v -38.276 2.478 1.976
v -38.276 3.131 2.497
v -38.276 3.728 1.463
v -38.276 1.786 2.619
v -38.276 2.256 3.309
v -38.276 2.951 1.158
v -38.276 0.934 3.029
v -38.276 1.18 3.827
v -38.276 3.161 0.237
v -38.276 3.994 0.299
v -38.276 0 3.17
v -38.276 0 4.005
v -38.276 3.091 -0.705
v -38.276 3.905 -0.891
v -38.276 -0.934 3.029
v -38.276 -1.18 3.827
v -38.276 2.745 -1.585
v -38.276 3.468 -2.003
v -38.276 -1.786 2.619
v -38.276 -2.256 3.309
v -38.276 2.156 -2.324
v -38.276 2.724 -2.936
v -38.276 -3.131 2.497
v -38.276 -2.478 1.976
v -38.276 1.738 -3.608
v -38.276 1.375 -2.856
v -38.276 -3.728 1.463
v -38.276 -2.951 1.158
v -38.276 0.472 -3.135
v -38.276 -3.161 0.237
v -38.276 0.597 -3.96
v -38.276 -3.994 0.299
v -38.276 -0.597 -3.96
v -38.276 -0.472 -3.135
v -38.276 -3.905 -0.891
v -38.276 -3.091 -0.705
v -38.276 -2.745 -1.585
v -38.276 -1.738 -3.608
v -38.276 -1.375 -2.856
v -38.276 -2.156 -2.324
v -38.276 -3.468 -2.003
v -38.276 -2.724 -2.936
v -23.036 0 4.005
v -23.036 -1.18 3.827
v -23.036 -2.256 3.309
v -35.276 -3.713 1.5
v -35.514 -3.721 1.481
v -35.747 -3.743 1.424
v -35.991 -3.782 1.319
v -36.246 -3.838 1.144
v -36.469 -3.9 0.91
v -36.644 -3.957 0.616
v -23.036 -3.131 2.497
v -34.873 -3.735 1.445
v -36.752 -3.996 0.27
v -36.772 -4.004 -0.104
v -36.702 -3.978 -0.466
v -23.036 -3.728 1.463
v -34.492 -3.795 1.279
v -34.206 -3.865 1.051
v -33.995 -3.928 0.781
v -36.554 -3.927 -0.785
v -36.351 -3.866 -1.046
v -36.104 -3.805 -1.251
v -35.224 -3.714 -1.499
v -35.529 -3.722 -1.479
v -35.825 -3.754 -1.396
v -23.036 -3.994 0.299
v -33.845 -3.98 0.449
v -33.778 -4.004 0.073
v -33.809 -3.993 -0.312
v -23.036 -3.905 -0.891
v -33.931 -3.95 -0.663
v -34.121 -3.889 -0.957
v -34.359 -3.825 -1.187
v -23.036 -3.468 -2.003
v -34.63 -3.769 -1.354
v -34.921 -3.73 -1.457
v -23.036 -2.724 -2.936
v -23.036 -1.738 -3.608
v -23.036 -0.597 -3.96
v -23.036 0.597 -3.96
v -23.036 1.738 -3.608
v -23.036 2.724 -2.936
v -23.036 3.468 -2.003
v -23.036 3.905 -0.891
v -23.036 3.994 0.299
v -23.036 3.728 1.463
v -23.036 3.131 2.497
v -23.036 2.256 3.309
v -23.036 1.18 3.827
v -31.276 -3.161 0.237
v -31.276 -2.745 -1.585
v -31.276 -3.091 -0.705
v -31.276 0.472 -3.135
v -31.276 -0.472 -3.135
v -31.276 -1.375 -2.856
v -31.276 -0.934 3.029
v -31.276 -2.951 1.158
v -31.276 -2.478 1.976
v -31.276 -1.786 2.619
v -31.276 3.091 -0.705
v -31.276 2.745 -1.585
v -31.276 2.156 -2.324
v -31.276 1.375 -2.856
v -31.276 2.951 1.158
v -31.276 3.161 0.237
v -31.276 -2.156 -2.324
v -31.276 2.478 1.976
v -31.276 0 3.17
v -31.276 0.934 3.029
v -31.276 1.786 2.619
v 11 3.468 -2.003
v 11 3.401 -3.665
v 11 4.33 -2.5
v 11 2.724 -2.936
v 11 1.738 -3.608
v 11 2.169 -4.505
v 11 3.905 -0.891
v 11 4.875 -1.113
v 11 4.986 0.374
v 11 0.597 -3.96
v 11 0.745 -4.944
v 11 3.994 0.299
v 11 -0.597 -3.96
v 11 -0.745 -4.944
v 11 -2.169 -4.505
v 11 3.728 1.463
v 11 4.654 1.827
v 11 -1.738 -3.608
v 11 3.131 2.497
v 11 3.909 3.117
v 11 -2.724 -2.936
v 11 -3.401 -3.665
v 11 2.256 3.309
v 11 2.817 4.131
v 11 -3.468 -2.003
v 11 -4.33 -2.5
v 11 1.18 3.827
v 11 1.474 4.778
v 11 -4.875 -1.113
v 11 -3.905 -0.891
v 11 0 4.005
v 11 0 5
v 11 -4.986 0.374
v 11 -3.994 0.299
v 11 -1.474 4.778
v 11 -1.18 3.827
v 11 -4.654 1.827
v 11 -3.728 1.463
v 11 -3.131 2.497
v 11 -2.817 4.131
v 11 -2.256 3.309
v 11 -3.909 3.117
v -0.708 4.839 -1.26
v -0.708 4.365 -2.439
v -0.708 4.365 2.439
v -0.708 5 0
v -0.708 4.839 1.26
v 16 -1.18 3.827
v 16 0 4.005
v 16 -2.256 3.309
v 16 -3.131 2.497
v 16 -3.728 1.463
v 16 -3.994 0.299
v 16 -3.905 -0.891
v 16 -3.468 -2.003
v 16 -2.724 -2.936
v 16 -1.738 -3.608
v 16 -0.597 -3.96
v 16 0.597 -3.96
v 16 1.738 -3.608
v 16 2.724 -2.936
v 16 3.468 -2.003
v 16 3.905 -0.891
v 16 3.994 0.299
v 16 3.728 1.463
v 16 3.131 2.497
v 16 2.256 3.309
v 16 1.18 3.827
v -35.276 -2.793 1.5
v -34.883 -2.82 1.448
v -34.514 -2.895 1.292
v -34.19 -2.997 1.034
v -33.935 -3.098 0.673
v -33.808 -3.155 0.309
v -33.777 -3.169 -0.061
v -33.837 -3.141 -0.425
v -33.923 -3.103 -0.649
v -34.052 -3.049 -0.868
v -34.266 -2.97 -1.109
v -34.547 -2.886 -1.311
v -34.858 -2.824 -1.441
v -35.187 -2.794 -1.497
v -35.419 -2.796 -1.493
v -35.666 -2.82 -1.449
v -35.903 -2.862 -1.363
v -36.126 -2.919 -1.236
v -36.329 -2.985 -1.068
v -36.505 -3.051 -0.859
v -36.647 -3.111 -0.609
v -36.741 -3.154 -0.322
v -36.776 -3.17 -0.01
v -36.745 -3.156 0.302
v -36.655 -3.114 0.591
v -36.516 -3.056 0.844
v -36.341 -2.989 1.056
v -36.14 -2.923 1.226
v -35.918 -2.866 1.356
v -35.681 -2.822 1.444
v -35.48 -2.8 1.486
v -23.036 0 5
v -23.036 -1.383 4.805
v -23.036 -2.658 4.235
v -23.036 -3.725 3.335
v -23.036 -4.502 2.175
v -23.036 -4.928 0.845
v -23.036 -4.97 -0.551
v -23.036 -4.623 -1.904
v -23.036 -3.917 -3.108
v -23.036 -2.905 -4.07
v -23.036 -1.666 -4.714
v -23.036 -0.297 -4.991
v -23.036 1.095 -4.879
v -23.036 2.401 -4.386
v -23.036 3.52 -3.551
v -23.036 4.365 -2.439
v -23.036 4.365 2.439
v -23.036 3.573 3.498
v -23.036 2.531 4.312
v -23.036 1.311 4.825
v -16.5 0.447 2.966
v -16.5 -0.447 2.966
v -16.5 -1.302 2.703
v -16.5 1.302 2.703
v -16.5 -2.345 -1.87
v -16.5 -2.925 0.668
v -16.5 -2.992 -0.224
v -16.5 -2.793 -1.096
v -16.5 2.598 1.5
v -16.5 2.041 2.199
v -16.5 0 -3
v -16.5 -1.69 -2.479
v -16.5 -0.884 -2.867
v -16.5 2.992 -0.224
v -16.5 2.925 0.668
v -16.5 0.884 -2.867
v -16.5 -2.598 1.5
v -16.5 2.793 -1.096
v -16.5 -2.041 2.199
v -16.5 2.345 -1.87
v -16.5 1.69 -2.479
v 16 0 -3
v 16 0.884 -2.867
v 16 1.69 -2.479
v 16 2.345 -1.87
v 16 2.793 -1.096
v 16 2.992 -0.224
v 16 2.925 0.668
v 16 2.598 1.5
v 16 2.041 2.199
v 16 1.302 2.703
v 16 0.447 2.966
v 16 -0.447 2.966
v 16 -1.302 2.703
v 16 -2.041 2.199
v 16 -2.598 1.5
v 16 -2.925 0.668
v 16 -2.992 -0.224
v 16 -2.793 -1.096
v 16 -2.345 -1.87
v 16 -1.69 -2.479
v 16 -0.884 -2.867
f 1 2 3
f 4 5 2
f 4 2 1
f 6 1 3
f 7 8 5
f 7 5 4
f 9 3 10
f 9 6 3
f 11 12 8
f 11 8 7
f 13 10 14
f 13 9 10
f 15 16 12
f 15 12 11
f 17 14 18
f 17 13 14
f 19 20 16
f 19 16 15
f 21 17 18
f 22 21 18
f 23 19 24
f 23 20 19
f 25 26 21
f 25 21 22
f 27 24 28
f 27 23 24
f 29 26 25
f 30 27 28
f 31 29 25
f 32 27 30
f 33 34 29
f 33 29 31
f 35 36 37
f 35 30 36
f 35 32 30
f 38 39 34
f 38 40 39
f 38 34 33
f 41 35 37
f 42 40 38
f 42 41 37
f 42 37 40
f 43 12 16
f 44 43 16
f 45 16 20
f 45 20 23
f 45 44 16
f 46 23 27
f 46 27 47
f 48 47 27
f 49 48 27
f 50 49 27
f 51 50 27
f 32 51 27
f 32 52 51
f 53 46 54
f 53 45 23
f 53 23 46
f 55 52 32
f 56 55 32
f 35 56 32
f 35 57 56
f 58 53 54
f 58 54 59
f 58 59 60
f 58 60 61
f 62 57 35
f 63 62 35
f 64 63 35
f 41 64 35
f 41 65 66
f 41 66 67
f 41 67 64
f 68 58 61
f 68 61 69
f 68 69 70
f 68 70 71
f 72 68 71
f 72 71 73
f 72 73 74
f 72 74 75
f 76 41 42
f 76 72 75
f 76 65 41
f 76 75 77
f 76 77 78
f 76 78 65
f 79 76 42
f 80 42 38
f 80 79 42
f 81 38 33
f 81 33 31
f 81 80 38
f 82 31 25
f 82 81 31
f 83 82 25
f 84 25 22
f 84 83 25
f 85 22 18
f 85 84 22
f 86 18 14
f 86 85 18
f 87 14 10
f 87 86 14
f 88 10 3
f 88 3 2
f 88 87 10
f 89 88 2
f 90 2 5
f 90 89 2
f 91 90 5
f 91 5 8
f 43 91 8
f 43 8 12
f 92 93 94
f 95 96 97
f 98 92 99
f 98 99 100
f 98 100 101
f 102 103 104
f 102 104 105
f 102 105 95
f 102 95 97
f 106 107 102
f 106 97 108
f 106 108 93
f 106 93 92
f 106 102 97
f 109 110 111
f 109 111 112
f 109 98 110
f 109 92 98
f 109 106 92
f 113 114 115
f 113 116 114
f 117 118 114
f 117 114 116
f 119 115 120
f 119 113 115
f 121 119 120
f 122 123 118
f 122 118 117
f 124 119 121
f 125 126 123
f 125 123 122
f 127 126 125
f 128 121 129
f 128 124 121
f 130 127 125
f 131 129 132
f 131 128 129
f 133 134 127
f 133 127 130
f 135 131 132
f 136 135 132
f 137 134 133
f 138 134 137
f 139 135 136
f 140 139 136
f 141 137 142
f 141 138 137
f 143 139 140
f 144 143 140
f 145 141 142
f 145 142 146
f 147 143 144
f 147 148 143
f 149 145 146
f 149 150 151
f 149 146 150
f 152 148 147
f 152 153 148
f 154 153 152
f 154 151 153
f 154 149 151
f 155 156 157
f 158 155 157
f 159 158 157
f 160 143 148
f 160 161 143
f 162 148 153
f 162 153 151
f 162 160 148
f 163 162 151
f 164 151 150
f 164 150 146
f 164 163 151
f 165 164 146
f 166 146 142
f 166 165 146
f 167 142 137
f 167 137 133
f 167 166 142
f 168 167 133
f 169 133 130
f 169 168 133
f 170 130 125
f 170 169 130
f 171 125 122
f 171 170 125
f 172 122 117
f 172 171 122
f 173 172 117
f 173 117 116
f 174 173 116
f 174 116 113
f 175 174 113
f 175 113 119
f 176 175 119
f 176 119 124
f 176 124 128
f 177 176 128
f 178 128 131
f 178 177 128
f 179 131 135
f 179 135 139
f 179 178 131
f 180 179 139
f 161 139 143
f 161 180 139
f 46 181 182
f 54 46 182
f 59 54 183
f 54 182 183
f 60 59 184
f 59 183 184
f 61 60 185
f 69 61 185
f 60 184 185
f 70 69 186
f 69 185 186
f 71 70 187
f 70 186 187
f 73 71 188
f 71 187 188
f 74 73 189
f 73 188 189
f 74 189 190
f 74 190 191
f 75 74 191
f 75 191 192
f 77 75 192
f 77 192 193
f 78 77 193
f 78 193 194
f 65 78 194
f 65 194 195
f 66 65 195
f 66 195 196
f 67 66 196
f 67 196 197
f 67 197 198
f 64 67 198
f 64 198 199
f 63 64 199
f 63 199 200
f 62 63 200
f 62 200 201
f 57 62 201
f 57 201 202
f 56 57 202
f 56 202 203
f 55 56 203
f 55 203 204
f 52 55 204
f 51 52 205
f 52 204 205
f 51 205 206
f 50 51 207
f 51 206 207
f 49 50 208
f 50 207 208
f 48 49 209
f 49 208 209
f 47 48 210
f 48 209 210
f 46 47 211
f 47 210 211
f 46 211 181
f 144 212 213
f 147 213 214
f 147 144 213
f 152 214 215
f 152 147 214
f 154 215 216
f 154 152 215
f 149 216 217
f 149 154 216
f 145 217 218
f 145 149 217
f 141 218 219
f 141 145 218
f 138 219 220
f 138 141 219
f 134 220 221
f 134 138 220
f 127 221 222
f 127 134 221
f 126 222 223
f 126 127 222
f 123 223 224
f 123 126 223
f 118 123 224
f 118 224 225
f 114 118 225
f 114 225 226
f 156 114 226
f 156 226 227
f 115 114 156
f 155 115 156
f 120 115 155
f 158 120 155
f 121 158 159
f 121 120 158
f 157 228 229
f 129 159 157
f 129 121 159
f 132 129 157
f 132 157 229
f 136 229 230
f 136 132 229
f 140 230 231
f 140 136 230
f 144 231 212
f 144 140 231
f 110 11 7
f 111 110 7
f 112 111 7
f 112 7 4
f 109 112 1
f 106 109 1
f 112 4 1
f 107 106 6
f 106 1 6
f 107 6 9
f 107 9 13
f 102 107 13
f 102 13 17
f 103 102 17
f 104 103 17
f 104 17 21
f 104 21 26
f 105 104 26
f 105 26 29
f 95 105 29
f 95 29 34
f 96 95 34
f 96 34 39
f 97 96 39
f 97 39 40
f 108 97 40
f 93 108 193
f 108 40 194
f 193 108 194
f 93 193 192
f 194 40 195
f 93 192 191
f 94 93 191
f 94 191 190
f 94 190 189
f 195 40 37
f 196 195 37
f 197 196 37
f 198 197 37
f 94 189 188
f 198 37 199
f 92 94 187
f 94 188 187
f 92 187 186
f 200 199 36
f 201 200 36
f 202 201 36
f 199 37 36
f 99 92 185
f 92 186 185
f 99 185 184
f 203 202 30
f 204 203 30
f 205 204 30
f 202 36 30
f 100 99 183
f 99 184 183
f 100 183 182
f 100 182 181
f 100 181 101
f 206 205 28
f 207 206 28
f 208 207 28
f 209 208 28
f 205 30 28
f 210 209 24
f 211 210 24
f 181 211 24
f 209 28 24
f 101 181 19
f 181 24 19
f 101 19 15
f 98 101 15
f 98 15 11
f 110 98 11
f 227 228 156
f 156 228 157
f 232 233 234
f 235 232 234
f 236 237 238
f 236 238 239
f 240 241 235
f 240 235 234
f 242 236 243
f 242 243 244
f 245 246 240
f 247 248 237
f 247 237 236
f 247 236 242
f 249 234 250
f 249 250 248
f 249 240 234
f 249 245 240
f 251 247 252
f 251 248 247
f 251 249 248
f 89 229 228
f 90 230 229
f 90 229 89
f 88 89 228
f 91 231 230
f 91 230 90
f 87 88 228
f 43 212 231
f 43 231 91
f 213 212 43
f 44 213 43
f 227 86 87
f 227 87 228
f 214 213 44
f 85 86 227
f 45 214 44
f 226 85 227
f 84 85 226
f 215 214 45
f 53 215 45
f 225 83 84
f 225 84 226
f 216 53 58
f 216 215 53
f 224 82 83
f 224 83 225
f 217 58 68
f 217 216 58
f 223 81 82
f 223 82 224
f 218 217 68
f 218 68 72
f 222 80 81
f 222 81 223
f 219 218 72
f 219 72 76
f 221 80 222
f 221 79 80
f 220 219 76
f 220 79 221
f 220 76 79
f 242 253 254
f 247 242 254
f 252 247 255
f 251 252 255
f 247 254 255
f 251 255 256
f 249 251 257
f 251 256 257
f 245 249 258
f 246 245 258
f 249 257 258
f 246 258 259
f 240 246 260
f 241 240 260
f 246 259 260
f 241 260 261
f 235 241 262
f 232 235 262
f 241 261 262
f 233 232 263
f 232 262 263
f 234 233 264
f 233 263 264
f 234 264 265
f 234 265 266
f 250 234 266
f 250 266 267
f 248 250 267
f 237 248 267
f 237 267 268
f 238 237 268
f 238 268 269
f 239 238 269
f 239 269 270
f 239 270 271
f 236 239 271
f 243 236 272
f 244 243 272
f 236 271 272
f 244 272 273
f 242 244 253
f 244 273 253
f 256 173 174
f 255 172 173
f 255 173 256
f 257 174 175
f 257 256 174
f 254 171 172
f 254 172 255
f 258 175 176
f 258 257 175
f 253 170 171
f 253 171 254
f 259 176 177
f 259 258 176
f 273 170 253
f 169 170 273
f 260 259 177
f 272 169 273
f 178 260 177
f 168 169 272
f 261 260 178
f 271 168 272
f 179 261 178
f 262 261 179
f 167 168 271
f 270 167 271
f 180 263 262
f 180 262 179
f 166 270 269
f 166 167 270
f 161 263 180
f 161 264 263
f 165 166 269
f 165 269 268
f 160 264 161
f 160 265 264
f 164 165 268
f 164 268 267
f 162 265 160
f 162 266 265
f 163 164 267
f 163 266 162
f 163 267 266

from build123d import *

# Parameters (mm, degrees)
SKETCH8_R          = 1.5
CUT_EXTRUDE2_DEPTH = 10
SKETCH9_R          = 3.17
CUT_EXTRUDE3_DEPTH = 7
SKETCH10_R         = 3
CUT_EXTRUDE4_DEPTH = 32.5
SKETCH12_W         = 24.803289192
SKETCH12_H         = 5.136244689
CUT_EXTRUDE5_DEPTH = 12.7


with BuildPart() as part:
    # Sketch6 → Revolve1 (revolve)
    with BuildSketch(Plane.XY, mode=Mode.PRIVATE) as revolve1_sk:
        Polygon((-38.276, 0), (-38.276, 4.005), (-23.036, 4.005), (-23.036, 5), (11, 5), (11, 4.005), (16, 4.005), (16, 0), align=None)
    revolve(revolve1_sk.sketch.rotate(Axis((-1000, 0, 0), (1, 0, 0)), 90), axis=Axis((-1000, 0, 0), (1, 0, 0)))

    # Sketch8 → Cut-Extrude2 (cut)
    with BuildSketch(Plane(origin=(0, 0, 0), x_dir=(1, 0, 0), z_dir=(0, 1, 0))):
        with Locations(Location((-35.276, 0, 0), (0, 0, 270))):
            Circle(SKETCH8_R)
    extrude(amount=-CUT_EXTRUDE2_DEPTH, mode=Mode.SUBTRACT)

    # Sketch9 → Cut-Extrude3 (cut)
    with BuildSketch(Plane.ZY.offset(38.276)):
        Circle(SKETCH9_R)
    extrude(amount=-CUT_EXTRUDE3_DEPTH, mode=Mode.SUBTRACT)

    # Sketch10 → Cut-Extrude4 (cut)
    with BuildSketch(Plane(origin=(16, 0, 0), x_dir=(0, 0, -1), z_dir=(1, 0, 0))):
        Circle(SKETCH10_R)
    extrude(amount=-CUT_EXTRUDE4_DEPTH, mode=Mode.SUBTRACT)

    # Sketch12 → Cut-Extrude5 (cut, symmetric)
    with BuildSketch(Plane.XY):
        with Locations((-13.109401935, 6.933122345)):
            Rectangle(SKETCH12_W, SKETCH12_H)
    extrude(amount=CUT_EXTRUDE5_DEPTH, both=True, mode=Mode.SUBTRACT)


solid = part.part
